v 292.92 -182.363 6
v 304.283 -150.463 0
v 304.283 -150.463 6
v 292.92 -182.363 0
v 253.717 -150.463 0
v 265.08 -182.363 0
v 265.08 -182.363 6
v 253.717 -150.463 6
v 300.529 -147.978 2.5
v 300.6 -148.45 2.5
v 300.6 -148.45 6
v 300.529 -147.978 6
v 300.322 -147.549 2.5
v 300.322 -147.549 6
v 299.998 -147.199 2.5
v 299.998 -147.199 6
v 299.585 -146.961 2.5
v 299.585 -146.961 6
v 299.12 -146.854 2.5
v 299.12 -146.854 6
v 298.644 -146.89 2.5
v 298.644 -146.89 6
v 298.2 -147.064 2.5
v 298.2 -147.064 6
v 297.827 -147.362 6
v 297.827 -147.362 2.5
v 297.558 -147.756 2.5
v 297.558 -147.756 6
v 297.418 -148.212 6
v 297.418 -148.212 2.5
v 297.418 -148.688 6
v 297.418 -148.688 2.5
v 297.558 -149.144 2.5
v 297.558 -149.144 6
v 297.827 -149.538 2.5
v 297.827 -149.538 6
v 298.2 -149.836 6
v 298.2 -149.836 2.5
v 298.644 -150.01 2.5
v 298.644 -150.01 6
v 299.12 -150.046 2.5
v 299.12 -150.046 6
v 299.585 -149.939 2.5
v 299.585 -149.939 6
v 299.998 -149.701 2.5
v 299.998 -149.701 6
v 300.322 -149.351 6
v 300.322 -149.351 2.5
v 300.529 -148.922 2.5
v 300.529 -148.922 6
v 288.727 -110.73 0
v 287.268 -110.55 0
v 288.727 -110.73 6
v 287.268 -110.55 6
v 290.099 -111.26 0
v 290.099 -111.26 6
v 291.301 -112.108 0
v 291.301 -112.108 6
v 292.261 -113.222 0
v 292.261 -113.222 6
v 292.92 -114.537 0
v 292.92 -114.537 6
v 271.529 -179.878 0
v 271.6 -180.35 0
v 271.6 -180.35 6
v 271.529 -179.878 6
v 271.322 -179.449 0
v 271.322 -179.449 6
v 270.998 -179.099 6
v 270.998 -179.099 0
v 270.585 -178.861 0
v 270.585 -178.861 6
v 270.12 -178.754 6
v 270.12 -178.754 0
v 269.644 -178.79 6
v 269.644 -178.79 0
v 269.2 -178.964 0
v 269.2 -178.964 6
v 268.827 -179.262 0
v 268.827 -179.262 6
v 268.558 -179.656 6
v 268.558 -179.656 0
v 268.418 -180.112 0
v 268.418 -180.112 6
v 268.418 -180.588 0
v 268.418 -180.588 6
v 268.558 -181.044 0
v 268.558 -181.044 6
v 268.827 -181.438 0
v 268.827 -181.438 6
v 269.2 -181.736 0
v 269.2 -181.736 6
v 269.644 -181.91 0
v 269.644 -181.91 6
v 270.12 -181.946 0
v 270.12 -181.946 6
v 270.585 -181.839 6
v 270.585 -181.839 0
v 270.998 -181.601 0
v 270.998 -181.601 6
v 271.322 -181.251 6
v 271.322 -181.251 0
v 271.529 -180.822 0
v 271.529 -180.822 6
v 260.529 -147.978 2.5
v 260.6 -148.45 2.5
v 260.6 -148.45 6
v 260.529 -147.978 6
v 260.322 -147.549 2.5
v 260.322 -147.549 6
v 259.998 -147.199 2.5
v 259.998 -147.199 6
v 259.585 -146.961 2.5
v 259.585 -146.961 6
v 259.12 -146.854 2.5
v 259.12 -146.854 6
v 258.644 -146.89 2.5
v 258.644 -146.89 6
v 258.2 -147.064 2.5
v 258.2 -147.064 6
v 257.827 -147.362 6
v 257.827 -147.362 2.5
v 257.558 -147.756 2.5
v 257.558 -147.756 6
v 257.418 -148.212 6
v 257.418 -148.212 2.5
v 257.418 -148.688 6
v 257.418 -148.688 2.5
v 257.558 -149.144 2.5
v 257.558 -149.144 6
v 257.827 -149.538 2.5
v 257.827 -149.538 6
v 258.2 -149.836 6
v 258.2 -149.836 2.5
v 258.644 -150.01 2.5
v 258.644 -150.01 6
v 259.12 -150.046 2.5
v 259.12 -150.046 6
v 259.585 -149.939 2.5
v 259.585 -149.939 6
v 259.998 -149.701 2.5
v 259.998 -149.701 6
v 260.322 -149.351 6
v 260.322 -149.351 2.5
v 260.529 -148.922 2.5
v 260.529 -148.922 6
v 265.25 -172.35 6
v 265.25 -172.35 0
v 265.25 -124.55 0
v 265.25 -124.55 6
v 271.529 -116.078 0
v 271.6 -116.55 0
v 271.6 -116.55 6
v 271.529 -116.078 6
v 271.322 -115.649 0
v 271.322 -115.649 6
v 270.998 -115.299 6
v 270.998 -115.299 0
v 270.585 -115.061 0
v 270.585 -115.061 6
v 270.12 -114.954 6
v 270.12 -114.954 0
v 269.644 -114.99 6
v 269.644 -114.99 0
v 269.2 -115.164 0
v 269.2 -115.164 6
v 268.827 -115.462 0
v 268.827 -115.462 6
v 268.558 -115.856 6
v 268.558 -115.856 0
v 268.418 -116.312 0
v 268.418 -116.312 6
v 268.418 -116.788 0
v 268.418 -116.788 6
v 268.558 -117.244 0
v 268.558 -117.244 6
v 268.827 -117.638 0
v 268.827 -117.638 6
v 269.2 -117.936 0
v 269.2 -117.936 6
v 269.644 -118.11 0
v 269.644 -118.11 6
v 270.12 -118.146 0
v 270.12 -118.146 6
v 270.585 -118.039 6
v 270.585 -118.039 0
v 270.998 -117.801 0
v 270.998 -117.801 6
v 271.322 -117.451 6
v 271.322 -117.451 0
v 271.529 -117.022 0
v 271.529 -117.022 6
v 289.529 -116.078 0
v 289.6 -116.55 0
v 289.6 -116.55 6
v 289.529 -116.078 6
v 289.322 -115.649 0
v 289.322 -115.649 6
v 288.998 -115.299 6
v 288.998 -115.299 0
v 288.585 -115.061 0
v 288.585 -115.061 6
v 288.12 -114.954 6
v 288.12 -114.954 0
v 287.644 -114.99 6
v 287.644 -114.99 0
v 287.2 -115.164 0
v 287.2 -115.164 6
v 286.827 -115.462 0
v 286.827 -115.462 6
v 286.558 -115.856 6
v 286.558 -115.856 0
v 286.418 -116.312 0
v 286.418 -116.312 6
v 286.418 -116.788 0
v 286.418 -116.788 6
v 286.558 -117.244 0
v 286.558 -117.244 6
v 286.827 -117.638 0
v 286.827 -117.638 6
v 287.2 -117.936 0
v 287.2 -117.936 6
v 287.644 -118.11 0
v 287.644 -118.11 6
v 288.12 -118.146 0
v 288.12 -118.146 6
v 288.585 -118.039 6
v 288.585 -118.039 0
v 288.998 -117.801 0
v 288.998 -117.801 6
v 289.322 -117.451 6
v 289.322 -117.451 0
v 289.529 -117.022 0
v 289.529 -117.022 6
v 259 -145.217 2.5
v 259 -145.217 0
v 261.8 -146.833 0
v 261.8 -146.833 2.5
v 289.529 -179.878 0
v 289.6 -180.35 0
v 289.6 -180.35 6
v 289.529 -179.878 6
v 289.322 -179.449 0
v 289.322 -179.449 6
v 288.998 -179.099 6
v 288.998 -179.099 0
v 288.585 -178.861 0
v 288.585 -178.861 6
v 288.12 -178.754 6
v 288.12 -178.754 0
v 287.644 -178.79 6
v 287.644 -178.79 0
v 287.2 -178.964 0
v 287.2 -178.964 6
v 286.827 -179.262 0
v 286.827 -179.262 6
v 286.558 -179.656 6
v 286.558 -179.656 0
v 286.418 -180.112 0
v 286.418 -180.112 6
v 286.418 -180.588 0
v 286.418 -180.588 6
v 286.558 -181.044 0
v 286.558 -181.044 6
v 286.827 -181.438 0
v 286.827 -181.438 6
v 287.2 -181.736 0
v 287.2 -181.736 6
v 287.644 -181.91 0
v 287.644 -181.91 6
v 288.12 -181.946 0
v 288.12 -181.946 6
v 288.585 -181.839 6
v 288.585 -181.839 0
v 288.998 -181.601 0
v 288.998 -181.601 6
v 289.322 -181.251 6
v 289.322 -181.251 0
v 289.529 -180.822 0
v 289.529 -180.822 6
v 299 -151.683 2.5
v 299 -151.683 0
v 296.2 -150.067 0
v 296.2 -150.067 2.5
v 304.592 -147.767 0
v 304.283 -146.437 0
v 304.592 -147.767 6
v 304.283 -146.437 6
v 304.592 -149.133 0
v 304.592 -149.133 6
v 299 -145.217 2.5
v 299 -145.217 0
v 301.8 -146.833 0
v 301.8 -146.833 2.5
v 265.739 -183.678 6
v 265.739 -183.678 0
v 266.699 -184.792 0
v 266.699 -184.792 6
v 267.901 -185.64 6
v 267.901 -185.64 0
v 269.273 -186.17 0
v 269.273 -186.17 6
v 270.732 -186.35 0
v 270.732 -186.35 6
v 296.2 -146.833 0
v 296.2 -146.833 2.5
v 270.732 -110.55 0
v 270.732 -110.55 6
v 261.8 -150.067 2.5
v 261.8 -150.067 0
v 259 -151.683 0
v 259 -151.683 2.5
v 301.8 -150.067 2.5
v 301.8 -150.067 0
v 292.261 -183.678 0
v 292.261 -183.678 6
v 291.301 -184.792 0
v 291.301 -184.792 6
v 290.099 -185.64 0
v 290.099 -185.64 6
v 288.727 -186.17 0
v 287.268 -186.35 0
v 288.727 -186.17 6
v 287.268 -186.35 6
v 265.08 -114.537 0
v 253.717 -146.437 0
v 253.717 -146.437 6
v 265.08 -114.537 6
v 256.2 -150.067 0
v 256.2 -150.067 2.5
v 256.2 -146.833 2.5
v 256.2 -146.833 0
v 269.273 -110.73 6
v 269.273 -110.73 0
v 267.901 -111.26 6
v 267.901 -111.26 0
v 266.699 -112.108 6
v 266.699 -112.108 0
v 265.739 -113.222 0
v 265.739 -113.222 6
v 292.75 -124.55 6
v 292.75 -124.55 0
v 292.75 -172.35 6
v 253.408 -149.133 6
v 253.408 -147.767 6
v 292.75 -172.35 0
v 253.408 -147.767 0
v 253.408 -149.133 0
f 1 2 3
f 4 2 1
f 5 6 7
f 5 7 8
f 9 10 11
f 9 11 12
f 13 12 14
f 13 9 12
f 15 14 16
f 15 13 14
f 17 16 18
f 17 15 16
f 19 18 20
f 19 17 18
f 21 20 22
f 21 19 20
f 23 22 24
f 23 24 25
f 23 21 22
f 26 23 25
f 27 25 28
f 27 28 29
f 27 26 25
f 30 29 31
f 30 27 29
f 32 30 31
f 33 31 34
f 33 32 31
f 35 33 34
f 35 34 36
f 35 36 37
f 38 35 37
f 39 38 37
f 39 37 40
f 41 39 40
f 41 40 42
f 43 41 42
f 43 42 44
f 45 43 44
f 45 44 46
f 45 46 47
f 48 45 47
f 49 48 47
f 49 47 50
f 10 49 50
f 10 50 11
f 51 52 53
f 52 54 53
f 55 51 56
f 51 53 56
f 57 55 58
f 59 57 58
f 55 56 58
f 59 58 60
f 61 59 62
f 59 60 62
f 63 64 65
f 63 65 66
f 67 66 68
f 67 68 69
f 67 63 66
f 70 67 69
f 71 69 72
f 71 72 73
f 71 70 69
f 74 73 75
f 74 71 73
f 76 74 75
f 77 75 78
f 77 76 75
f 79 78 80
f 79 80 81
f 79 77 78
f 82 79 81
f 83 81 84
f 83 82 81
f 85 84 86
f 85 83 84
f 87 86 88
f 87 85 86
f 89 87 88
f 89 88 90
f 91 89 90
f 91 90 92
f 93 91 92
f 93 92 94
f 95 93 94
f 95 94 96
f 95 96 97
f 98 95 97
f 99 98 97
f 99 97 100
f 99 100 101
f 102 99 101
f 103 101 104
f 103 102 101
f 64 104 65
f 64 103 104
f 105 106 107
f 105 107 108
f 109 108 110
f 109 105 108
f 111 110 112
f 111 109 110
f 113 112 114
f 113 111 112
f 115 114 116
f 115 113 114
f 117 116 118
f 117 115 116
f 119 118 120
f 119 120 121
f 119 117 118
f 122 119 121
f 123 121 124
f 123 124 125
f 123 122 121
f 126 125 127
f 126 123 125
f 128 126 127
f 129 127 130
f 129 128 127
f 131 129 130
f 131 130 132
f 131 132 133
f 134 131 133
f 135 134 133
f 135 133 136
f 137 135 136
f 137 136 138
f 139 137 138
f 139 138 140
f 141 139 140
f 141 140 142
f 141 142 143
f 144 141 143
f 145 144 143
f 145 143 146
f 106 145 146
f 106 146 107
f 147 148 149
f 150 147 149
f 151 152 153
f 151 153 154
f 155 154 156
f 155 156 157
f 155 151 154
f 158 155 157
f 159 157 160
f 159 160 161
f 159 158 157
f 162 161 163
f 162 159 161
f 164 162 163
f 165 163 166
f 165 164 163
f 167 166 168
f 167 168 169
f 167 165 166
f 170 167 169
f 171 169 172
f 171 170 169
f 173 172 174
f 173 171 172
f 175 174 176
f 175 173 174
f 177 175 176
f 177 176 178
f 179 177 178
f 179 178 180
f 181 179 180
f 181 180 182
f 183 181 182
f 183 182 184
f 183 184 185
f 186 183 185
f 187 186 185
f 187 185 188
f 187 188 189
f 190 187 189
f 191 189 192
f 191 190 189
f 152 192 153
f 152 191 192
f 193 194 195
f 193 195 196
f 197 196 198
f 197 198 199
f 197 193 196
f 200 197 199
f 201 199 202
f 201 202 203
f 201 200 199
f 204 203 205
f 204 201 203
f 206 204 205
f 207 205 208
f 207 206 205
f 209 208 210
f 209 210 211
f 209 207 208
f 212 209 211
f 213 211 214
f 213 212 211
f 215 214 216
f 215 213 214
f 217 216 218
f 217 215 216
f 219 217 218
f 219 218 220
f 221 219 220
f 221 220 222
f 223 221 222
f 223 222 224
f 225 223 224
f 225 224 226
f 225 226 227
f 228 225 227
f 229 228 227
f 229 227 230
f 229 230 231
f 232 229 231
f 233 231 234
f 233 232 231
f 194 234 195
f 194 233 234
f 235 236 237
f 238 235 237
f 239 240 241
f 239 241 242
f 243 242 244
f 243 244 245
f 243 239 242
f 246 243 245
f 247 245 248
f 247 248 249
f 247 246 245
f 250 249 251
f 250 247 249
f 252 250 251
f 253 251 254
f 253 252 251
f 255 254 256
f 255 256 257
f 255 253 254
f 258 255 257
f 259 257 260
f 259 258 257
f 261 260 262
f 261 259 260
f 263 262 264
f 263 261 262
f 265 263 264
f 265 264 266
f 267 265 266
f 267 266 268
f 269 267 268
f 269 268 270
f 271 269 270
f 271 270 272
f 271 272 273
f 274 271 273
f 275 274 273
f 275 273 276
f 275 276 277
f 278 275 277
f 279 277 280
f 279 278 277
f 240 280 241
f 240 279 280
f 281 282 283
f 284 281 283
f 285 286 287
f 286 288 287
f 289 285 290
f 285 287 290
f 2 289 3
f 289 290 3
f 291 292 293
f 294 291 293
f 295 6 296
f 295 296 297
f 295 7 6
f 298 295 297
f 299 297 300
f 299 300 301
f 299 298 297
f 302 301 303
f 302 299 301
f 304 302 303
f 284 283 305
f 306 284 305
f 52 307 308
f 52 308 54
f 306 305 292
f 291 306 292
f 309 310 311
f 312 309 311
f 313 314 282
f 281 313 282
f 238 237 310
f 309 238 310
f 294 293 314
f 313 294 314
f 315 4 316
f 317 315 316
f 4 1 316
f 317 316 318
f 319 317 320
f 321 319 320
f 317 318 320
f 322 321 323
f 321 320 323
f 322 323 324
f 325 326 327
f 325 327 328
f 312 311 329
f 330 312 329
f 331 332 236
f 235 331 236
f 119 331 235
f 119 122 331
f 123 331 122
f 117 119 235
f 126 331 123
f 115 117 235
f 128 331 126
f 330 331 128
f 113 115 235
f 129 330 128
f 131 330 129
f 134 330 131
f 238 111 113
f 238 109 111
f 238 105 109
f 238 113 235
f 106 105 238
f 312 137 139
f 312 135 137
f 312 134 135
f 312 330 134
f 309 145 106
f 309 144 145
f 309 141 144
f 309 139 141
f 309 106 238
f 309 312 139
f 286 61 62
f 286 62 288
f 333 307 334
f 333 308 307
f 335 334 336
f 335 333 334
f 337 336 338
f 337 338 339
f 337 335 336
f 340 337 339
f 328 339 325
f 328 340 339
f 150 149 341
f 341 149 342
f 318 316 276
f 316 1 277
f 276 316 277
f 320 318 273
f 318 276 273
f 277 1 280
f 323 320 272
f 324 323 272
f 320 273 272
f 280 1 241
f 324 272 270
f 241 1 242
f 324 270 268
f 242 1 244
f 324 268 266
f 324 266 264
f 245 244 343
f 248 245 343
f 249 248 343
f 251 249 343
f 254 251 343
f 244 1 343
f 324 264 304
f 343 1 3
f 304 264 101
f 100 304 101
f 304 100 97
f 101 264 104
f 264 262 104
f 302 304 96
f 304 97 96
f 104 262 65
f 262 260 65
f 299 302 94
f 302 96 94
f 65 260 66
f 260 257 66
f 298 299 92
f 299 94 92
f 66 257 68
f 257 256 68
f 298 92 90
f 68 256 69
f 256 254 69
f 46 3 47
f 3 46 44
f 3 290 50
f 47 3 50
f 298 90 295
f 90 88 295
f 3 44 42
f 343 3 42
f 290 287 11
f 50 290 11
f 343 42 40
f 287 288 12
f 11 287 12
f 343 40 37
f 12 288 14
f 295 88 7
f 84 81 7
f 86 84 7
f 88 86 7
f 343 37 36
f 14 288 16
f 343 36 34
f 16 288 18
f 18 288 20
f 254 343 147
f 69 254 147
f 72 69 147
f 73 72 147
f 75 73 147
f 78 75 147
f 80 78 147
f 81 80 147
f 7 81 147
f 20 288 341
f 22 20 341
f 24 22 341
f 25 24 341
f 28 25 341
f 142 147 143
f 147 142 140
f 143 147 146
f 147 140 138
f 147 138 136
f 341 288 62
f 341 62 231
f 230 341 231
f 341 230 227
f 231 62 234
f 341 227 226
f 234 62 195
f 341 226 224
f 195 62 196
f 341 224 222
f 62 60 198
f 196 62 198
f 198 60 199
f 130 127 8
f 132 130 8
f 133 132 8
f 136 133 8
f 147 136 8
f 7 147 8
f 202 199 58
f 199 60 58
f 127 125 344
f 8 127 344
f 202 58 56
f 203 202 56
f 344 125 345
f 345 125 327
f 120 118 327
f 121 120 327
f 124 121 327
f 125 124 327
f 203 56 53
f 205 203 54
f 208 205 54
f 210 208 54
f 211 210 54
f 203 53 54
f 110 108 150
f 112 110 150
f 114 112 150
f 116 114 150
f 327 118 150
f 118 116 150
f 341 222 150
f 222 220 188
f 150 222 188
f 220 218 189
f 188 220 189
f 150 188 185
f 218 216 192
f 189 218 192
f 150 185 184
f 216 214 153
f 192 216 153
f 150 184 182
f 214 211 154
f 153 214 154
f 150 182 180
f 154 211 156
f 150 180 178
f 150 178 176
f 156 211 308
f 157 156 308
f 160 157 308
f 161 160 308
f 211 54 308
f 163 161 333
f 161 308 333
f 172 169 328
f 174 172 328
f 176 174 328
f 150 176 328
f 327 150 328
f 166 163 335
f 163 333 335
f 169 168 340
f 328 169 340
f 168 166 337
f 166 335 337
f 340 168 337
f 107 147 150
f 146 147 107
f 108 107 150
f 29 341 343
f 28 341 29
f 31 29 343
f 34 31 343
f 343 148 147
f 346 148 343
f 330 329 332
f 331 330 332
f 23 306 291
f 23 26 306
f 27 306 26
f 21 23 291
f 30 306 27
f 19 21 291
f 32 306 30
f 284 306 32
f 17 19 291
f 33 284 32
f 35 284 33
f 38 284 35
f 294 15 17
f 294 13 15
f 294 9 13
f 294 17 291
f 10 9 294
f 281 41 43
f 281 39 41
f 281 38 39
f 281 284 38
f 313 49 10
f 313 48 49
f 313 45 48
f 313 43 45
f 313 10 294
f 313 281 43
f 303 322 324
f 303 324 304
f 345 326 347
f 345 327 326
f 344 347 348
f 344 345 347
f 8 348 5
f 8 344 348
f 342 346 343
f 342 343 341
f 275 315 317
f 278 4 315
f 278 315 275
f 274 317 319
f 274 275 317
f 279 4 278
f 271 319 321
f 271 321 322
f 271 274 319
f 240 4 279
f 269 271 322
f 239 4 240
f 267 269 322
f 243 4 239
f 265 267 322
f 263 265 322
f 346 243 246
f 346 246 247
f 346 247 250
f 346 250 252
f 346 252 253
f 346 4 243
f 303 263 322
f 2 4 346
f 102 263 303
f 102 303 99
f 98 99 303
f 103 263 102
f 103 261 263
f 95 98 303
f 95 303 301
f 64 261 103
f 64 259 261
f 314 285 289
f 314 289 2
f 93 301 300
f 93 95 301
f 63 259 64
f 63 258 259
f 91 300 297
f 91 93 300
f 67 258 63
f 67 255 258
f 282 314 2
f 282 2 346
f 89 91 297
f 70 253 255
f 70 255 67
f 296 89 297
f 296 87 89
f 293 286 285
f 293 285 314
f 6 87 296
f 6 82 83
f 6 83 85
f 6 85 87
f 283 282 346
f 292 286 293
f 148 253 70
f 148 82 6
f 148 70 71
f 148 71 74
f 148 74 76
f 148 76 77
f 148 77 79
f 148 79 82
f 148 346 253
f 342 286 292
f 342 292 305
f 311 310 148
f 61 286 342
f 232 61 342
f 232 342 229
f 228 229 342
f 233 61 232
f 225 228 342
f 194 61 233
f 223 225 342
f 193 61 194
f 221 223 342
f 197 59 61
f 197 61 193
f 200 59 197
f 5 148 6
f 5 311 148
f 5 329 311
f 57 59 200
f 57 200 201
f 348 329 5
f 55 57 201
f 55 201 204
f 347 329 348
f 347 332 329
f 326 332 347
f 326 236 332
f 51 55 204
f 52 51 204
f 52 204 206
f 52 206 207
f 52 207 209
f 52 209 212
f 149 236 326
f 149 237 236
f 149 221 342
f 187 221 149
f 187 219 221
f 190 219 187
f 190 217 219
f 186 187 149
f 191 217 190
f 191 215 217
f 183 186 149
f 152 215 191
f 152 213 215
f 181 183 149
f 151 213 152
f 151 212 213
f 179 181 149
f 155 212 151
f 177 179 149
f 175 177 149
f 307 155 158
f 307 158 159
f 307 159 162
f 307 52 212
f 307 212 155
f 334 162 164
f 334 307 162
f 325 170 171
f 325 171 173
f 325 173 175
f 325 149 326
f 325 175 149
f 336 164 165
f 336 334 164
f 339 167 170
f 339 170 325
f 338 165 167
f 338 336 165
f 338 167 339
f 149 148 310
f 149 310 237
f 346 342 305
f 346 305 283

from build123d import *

# Parameters (mm, degrees)
SKETCH_R     = 1.6
SKETCH_W     = 27.5
SKETCH_H     = 47.8
PAD_DEPTH    = 6
POCKET_DEPTH = 2.5
FILLET_R     = 6


with BuildPart() as part:
    # Sketch (on Face1 of ShapeBinder) → Pad (new body)
    with BuildSketch(Plane.XY):
        Polygon((266.5, -110.55), (291.5, -110.55), (305, -148.45), (291.5, -186.35), (266.5, -186.35), (253, -148.45), align=None)
        with Locations((270, -116.55)):
            Circle(SKETCH_R, mode=Mode.SUBTRACT)
        with Locations((288, -116.55)):
            Circle(SKETCH_R, mode=Mode.SUBTRACT)
        with Locations((299, -148.45)):
            Circle(SKETCH_R, mode=Mode.SUBTRACT)
        with Locations((259, -148.45)):
            Circle(SKETCH_R, mode=Mode.SUBTRACT)
        with Locations((270, -180.35)):
            Circle(SKETCH_R, mode=Mode.SUBTRACT)
        with Locations((288, -180.35)):
            Circle(SKETCH_R, mode=Mode.SUBTRACT)
        with Locations((279, -148.45)):
            Rectangle(SKETCH_W, SKETCH_H, mode=Mode.SUBTRACT)
    extrude(amount=PAD_DEPTH)

    # Sketch001 (on Face17 of Pad) → Pocket (cut)
    with BuildSketch(Plane(origin=(0, 0, 0), x_dir=(1, 0, 0), z_dir=(0, 0, -1))):
        Polygon((261.8, 146.833419), (261.8, 150.066581), (259, 151.683162), (256.2, 150.066581), (256.2, 146.833419), (259, 145.216838), align=None)
        Polygon((301.8, 146.833419), (301.8, 150.066581), (299, 151.683162), (296.2, 150.066581), (296.2, 146.833419), (299, 145.216838), align=None)
    extrude(amount=-POCKET_DEPTH, mode=Mode.SUBTRACT)

    # Fillet
    fillet_edges = [part.edges().sort_by_distance(p)[0] for p in [
        (291.5, -110.55, 3),
        (266.5, -110.55, 3),
        (253, -148.45, 3),
        (266.5, -186.35, 3),
        (291.5, -186.35, 3),
        (305, -148.45, 3),
    ]]
    fillet(fillet_edges, radius=FILLET_R)


solid = part.part
